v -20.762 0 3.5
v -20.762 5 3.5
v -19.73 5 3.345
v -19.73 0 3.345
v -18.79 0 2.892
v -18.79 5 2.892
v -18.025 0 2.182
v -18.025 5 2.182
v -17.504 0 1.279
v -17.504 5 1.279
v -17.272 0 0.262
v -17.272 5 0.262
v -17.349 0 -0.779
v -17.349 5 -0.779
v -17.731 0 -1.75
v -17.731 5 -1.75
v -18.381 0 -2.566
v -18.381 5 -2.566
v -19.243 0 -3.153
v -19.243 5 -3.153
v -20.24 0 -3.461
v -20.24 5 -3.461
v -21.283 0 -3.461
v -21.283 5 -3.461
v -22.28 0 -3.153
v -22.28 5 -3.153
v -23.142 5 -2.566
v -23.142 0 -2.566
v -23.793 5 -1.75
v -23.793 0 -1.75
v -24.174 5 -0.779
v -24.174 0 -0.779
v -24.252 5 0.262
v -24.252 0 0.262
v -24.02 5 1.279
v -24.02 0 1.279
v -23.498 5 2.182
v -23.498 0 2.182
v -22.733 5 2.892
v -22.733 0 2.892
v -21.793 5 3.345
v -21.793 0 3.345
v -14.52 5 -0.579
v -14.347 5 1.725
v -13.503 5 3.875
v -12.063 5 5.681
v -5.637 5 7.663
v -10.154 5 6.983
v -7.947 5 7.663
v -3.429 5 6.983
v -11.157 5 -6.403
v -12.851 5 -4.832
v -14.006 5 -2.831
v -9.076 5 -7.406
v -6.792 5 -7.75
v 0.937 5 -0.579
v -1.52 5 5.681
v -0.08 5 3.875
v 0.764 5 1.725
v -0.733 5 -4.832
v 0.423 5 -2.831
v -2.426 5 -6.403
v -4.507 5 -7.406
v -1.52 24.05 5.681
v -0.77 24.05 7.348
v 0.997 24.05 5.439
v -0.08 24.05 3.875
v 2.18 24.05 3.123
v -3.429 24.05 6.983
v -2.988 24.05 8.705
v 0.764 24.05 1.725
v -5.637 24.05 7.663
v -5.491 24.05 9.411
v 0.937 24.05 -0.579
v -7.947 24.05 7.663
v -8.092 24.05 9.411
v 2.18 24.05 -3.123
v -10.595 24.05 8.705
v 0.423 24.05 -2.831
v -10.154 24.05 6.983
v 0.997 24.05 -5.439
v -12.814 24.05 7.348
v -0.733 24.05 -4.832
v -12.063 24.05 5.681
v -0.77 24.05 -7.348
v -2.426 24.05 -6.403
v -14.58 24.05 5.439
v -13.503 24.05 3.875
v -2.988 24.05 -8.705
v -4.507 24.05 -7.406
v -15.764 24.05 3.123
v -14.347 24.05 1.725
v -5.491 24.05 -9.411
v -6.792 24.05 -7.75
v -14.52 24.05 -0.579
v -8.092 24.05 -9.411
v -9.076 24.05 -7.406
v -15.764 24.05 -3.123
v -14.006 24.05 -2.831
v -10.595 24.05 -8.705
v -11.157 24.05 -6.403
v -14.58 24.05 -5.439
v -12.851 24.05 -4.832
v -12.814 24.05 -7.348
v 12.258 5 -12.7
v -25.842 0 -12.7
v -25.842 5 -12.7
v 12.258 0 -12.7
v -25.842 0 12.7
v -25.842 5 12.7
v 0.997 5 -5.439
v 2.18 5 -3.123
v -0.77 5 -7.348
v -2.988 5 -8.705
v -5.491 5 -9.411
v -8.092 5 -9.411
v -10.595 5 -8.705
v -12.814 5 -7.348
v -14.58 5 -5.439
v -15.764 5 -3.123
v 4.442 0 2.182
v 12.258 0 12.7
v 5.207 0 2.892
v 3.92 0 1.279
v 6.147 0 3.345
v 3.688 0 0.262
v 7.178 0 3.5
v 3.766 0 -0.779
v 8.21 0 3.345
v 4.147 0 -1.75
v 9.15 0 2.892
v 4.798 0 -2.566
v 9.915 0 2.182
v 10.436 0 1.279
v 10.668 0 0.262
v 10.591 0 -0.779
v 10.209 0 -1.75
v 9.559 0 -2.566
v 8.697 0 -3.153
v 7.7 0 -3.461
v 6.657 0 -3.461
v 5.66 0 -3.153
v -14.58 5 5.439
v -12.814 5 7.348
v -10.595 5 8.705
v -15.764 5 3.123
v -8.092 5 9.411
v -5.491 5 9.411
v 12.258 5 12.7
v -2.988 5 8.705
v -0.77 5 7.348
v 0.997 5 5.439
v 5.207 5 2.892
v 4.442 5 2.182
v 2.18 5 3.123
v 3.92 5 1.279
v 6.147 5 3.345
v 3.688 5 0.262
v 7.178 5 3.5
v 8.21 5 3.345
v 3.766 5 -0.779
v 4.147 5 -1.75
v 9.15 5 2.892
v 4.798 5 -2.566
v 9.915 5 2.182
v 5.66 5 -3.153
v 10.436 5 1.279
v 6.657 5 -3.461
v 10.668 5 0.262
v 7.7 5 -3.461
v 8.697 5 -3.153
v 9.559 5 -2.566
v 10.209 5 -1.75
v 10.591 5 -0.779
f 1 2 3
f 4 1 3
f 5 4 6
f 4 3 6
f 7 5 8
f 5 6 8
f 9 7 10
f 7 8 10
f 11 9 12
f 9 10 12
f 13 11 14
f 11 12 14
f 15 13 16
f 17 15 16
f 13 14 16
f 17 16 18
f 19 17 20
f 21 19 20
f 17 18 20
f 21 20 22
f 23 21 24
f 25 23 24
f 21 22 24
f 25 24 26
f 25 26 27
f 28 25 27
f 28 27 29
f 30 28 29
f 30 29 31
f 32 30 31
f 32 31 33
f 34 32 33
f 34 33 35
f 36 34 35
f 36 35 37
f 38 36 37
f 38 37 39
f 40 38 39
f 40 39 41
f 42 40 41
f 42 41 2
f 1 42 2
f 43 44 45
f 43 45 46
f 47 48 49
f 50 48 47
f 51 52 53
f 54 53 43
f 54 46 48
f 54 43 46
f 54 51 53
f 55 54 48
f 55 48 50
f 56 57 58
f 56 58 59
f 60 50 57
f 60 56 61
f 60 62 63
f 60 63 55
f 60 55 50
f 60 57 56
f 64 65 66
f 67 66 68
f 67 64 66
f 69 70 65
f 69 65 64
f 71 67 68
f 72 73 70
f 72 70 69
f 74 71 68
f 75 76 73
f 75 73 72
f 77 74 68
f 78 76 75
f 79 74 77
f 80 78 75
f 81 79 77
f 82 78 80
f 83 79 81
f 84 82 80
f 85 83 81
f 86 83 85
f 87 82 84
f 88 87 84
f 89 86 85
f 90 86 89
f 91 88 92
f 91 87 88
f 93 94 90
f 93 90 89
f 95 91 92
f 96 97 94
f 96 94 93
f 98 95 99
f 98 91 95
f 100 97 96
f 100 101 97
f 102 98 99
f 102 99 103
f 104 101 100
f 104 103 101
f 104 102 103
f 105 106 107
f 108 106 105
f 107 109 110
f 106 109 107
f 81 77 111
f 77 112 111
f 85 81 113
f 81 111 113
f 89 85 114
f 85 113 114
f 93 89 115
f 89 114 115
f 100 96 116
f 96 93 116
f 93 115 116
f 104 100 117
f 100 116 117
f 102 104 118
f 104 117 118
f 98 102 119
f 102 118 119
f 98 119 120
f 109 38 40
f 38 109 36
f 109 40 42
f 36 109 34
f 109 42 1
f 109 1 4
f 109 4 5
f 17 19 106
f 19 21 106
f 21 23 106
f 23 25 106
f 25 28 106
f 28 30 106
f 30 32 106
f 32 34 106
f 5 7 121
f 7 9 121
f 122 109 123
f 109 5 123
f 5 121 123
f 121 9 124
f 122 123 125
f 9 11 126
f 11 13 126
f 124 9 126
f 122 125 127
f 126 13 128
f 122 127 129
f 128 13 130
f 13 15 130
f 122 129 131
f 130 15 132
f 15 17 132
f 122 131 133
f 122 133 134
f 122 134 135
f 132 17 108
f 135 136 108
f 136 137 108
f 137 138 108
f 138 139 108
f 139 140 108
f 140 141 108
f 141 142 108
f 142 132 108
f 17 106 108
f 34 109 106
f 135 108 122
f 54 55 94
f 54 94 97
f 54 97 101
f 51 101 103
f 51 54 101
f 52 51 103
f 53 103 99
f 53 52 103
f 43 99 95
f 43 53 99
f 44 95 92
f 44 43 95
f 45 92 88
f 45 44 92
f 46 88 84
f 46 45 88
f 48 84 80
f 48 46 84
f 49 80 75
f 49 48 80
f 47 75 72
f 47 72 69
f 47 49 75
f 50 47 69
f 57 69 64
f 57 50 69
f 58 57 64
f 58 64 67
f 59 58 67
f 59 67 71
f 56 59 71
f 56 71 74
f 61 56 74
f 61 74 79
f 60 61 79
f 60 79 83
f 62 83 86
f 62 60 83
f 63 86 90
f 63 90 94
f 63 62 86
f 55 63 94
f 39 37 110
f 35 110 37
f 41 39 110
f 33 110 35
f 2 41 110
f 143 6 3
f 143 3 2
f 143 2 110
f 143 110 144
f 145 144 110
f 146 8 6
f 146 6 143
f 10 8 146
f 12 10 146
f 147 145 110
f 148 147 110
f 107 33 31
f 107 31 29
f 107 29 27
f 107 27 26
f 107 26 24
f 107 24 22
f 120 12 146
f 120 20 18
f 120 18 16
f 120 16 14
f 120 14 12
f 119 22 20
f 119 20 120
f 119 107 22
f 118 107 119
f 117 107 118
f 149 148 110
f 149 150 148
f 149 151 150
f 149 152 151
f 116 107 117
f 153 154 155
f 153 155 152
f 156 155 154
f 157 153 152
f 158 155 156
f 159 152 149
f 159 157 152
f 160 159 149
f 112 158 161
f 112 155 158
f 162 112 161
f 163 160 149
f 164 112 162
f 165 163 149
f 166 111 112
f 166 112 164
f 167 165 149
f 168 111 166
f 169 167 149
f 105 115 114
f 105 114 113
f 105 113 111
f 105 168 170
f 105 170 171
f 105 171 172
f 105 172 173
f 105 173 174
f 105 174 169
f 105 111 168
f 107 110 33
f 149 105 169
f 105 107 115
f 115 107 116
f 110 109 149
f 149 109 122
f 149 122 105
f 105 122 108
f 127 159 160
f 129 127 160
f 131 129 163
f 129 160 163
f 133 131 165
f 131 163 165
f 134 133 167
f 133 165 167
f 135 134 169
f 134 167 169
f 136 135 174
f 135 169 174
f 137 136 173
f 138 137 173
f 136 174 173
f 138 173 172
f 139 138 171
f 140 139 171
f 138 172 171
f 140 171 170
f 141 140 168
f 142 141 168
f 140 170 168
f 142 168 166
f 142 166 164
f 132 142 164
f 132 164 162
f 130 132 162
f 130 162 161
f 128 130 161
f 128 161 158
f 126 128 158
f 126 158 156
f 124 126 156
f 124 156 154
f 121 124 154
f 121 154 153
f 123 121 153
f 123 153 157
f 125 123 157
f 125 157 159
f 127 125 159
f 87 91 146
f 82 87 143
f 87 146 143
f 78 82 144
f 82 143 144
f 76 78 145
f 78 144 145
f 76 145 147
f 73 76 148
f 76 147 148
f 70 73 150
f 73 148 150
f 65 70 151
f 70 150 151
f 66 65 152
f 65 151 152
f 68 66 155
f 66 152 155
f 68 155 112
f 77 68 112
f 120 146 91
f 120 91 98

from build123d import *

# Parameters (mm, degrees)
SKETCH1_W           = 38.1
SKETCH1_H           = 25.4
BOSS_EXTRUDE1_DEPTH = 5
SKETCH3_R           = 9.5
SKETCH3_R_2         = 7.75
BOSS_EXTRUDE2_DEPTH = 19.05
SKETCH4_R           = 3.5
CUT_EXTRUDE1_DEPTH  = 35.525178946
SKETCH5_W           = 1.6
SKETCH5_H           = 10
CUT_EXTRUDE2_DEPTH  = 35.525178946


with BuildPart() as part:
    # Sketch1 → Boss-Extrude1 (new body)
    with BuildSketch(Plane(origin=(0, 0, 0), x_dir=(1, 0, 0), z_dir=(0, 1, 0))):
        with Locations((-6.79173913, 0)):
            Rectangle(SKETCH1_W, SKETCH1_H)
    extrude(amount=BOSS_EXTRUDE1_DEPTH)

    # Sketch3 → Boss-Extrude2 (add)
    with BuildSketch(Plane(origin=(0, 5, 0), x_dir=(1, 0, 0), z_dir=(0, 1, 0))):
        with Locations((-6.79173913, 0)):
            Circle(SKETCH3_R)
        with Locations((-6.79173913, 0)):
            Circle(SKETCH3_R_2, mode=Mode.SUBTRACT)
    extrude(amount=BOSS_EXTRUDE2_DEPTH)

    # Sketch4 → Cut-Extrude1 (cut, through all)
    with BuildSketch(Plane(origin=(0, 5, 0), x_dir=(1, 0, 0), z_dir=(0, 1, 0))):
        with Locations((7.17826087, 0)):
            Circle(SKETCH4_R)
        with Locations((-20.76173913, 0)):
            Circle(SKETCH4_R)
    extrude(amount=-CUT_EXTRUDE1_DEPTH, mode=Mode.SUBTRACT)

    # Sketch5 → Cut-Extrude2 (cut, through all)
    with BuildSketch(Plane(origin=(0, 5, 0), x_dir=(1, 0, 0), z_dir=(0, 1, 0))):
        with Locations((-16.563639087, -0.415081282)):
            Rectangle(SKETCH5_W, SKETCH5_H)
        with Locations((2.980160826, -0.415081282)):
            Rectangle(SKETCH5_W, SKETCH5_H)
    extrude(amount=CUT_EXTRUDE2_DEPTH, mode=Mode.SUBTRACT)


solid = part.part
